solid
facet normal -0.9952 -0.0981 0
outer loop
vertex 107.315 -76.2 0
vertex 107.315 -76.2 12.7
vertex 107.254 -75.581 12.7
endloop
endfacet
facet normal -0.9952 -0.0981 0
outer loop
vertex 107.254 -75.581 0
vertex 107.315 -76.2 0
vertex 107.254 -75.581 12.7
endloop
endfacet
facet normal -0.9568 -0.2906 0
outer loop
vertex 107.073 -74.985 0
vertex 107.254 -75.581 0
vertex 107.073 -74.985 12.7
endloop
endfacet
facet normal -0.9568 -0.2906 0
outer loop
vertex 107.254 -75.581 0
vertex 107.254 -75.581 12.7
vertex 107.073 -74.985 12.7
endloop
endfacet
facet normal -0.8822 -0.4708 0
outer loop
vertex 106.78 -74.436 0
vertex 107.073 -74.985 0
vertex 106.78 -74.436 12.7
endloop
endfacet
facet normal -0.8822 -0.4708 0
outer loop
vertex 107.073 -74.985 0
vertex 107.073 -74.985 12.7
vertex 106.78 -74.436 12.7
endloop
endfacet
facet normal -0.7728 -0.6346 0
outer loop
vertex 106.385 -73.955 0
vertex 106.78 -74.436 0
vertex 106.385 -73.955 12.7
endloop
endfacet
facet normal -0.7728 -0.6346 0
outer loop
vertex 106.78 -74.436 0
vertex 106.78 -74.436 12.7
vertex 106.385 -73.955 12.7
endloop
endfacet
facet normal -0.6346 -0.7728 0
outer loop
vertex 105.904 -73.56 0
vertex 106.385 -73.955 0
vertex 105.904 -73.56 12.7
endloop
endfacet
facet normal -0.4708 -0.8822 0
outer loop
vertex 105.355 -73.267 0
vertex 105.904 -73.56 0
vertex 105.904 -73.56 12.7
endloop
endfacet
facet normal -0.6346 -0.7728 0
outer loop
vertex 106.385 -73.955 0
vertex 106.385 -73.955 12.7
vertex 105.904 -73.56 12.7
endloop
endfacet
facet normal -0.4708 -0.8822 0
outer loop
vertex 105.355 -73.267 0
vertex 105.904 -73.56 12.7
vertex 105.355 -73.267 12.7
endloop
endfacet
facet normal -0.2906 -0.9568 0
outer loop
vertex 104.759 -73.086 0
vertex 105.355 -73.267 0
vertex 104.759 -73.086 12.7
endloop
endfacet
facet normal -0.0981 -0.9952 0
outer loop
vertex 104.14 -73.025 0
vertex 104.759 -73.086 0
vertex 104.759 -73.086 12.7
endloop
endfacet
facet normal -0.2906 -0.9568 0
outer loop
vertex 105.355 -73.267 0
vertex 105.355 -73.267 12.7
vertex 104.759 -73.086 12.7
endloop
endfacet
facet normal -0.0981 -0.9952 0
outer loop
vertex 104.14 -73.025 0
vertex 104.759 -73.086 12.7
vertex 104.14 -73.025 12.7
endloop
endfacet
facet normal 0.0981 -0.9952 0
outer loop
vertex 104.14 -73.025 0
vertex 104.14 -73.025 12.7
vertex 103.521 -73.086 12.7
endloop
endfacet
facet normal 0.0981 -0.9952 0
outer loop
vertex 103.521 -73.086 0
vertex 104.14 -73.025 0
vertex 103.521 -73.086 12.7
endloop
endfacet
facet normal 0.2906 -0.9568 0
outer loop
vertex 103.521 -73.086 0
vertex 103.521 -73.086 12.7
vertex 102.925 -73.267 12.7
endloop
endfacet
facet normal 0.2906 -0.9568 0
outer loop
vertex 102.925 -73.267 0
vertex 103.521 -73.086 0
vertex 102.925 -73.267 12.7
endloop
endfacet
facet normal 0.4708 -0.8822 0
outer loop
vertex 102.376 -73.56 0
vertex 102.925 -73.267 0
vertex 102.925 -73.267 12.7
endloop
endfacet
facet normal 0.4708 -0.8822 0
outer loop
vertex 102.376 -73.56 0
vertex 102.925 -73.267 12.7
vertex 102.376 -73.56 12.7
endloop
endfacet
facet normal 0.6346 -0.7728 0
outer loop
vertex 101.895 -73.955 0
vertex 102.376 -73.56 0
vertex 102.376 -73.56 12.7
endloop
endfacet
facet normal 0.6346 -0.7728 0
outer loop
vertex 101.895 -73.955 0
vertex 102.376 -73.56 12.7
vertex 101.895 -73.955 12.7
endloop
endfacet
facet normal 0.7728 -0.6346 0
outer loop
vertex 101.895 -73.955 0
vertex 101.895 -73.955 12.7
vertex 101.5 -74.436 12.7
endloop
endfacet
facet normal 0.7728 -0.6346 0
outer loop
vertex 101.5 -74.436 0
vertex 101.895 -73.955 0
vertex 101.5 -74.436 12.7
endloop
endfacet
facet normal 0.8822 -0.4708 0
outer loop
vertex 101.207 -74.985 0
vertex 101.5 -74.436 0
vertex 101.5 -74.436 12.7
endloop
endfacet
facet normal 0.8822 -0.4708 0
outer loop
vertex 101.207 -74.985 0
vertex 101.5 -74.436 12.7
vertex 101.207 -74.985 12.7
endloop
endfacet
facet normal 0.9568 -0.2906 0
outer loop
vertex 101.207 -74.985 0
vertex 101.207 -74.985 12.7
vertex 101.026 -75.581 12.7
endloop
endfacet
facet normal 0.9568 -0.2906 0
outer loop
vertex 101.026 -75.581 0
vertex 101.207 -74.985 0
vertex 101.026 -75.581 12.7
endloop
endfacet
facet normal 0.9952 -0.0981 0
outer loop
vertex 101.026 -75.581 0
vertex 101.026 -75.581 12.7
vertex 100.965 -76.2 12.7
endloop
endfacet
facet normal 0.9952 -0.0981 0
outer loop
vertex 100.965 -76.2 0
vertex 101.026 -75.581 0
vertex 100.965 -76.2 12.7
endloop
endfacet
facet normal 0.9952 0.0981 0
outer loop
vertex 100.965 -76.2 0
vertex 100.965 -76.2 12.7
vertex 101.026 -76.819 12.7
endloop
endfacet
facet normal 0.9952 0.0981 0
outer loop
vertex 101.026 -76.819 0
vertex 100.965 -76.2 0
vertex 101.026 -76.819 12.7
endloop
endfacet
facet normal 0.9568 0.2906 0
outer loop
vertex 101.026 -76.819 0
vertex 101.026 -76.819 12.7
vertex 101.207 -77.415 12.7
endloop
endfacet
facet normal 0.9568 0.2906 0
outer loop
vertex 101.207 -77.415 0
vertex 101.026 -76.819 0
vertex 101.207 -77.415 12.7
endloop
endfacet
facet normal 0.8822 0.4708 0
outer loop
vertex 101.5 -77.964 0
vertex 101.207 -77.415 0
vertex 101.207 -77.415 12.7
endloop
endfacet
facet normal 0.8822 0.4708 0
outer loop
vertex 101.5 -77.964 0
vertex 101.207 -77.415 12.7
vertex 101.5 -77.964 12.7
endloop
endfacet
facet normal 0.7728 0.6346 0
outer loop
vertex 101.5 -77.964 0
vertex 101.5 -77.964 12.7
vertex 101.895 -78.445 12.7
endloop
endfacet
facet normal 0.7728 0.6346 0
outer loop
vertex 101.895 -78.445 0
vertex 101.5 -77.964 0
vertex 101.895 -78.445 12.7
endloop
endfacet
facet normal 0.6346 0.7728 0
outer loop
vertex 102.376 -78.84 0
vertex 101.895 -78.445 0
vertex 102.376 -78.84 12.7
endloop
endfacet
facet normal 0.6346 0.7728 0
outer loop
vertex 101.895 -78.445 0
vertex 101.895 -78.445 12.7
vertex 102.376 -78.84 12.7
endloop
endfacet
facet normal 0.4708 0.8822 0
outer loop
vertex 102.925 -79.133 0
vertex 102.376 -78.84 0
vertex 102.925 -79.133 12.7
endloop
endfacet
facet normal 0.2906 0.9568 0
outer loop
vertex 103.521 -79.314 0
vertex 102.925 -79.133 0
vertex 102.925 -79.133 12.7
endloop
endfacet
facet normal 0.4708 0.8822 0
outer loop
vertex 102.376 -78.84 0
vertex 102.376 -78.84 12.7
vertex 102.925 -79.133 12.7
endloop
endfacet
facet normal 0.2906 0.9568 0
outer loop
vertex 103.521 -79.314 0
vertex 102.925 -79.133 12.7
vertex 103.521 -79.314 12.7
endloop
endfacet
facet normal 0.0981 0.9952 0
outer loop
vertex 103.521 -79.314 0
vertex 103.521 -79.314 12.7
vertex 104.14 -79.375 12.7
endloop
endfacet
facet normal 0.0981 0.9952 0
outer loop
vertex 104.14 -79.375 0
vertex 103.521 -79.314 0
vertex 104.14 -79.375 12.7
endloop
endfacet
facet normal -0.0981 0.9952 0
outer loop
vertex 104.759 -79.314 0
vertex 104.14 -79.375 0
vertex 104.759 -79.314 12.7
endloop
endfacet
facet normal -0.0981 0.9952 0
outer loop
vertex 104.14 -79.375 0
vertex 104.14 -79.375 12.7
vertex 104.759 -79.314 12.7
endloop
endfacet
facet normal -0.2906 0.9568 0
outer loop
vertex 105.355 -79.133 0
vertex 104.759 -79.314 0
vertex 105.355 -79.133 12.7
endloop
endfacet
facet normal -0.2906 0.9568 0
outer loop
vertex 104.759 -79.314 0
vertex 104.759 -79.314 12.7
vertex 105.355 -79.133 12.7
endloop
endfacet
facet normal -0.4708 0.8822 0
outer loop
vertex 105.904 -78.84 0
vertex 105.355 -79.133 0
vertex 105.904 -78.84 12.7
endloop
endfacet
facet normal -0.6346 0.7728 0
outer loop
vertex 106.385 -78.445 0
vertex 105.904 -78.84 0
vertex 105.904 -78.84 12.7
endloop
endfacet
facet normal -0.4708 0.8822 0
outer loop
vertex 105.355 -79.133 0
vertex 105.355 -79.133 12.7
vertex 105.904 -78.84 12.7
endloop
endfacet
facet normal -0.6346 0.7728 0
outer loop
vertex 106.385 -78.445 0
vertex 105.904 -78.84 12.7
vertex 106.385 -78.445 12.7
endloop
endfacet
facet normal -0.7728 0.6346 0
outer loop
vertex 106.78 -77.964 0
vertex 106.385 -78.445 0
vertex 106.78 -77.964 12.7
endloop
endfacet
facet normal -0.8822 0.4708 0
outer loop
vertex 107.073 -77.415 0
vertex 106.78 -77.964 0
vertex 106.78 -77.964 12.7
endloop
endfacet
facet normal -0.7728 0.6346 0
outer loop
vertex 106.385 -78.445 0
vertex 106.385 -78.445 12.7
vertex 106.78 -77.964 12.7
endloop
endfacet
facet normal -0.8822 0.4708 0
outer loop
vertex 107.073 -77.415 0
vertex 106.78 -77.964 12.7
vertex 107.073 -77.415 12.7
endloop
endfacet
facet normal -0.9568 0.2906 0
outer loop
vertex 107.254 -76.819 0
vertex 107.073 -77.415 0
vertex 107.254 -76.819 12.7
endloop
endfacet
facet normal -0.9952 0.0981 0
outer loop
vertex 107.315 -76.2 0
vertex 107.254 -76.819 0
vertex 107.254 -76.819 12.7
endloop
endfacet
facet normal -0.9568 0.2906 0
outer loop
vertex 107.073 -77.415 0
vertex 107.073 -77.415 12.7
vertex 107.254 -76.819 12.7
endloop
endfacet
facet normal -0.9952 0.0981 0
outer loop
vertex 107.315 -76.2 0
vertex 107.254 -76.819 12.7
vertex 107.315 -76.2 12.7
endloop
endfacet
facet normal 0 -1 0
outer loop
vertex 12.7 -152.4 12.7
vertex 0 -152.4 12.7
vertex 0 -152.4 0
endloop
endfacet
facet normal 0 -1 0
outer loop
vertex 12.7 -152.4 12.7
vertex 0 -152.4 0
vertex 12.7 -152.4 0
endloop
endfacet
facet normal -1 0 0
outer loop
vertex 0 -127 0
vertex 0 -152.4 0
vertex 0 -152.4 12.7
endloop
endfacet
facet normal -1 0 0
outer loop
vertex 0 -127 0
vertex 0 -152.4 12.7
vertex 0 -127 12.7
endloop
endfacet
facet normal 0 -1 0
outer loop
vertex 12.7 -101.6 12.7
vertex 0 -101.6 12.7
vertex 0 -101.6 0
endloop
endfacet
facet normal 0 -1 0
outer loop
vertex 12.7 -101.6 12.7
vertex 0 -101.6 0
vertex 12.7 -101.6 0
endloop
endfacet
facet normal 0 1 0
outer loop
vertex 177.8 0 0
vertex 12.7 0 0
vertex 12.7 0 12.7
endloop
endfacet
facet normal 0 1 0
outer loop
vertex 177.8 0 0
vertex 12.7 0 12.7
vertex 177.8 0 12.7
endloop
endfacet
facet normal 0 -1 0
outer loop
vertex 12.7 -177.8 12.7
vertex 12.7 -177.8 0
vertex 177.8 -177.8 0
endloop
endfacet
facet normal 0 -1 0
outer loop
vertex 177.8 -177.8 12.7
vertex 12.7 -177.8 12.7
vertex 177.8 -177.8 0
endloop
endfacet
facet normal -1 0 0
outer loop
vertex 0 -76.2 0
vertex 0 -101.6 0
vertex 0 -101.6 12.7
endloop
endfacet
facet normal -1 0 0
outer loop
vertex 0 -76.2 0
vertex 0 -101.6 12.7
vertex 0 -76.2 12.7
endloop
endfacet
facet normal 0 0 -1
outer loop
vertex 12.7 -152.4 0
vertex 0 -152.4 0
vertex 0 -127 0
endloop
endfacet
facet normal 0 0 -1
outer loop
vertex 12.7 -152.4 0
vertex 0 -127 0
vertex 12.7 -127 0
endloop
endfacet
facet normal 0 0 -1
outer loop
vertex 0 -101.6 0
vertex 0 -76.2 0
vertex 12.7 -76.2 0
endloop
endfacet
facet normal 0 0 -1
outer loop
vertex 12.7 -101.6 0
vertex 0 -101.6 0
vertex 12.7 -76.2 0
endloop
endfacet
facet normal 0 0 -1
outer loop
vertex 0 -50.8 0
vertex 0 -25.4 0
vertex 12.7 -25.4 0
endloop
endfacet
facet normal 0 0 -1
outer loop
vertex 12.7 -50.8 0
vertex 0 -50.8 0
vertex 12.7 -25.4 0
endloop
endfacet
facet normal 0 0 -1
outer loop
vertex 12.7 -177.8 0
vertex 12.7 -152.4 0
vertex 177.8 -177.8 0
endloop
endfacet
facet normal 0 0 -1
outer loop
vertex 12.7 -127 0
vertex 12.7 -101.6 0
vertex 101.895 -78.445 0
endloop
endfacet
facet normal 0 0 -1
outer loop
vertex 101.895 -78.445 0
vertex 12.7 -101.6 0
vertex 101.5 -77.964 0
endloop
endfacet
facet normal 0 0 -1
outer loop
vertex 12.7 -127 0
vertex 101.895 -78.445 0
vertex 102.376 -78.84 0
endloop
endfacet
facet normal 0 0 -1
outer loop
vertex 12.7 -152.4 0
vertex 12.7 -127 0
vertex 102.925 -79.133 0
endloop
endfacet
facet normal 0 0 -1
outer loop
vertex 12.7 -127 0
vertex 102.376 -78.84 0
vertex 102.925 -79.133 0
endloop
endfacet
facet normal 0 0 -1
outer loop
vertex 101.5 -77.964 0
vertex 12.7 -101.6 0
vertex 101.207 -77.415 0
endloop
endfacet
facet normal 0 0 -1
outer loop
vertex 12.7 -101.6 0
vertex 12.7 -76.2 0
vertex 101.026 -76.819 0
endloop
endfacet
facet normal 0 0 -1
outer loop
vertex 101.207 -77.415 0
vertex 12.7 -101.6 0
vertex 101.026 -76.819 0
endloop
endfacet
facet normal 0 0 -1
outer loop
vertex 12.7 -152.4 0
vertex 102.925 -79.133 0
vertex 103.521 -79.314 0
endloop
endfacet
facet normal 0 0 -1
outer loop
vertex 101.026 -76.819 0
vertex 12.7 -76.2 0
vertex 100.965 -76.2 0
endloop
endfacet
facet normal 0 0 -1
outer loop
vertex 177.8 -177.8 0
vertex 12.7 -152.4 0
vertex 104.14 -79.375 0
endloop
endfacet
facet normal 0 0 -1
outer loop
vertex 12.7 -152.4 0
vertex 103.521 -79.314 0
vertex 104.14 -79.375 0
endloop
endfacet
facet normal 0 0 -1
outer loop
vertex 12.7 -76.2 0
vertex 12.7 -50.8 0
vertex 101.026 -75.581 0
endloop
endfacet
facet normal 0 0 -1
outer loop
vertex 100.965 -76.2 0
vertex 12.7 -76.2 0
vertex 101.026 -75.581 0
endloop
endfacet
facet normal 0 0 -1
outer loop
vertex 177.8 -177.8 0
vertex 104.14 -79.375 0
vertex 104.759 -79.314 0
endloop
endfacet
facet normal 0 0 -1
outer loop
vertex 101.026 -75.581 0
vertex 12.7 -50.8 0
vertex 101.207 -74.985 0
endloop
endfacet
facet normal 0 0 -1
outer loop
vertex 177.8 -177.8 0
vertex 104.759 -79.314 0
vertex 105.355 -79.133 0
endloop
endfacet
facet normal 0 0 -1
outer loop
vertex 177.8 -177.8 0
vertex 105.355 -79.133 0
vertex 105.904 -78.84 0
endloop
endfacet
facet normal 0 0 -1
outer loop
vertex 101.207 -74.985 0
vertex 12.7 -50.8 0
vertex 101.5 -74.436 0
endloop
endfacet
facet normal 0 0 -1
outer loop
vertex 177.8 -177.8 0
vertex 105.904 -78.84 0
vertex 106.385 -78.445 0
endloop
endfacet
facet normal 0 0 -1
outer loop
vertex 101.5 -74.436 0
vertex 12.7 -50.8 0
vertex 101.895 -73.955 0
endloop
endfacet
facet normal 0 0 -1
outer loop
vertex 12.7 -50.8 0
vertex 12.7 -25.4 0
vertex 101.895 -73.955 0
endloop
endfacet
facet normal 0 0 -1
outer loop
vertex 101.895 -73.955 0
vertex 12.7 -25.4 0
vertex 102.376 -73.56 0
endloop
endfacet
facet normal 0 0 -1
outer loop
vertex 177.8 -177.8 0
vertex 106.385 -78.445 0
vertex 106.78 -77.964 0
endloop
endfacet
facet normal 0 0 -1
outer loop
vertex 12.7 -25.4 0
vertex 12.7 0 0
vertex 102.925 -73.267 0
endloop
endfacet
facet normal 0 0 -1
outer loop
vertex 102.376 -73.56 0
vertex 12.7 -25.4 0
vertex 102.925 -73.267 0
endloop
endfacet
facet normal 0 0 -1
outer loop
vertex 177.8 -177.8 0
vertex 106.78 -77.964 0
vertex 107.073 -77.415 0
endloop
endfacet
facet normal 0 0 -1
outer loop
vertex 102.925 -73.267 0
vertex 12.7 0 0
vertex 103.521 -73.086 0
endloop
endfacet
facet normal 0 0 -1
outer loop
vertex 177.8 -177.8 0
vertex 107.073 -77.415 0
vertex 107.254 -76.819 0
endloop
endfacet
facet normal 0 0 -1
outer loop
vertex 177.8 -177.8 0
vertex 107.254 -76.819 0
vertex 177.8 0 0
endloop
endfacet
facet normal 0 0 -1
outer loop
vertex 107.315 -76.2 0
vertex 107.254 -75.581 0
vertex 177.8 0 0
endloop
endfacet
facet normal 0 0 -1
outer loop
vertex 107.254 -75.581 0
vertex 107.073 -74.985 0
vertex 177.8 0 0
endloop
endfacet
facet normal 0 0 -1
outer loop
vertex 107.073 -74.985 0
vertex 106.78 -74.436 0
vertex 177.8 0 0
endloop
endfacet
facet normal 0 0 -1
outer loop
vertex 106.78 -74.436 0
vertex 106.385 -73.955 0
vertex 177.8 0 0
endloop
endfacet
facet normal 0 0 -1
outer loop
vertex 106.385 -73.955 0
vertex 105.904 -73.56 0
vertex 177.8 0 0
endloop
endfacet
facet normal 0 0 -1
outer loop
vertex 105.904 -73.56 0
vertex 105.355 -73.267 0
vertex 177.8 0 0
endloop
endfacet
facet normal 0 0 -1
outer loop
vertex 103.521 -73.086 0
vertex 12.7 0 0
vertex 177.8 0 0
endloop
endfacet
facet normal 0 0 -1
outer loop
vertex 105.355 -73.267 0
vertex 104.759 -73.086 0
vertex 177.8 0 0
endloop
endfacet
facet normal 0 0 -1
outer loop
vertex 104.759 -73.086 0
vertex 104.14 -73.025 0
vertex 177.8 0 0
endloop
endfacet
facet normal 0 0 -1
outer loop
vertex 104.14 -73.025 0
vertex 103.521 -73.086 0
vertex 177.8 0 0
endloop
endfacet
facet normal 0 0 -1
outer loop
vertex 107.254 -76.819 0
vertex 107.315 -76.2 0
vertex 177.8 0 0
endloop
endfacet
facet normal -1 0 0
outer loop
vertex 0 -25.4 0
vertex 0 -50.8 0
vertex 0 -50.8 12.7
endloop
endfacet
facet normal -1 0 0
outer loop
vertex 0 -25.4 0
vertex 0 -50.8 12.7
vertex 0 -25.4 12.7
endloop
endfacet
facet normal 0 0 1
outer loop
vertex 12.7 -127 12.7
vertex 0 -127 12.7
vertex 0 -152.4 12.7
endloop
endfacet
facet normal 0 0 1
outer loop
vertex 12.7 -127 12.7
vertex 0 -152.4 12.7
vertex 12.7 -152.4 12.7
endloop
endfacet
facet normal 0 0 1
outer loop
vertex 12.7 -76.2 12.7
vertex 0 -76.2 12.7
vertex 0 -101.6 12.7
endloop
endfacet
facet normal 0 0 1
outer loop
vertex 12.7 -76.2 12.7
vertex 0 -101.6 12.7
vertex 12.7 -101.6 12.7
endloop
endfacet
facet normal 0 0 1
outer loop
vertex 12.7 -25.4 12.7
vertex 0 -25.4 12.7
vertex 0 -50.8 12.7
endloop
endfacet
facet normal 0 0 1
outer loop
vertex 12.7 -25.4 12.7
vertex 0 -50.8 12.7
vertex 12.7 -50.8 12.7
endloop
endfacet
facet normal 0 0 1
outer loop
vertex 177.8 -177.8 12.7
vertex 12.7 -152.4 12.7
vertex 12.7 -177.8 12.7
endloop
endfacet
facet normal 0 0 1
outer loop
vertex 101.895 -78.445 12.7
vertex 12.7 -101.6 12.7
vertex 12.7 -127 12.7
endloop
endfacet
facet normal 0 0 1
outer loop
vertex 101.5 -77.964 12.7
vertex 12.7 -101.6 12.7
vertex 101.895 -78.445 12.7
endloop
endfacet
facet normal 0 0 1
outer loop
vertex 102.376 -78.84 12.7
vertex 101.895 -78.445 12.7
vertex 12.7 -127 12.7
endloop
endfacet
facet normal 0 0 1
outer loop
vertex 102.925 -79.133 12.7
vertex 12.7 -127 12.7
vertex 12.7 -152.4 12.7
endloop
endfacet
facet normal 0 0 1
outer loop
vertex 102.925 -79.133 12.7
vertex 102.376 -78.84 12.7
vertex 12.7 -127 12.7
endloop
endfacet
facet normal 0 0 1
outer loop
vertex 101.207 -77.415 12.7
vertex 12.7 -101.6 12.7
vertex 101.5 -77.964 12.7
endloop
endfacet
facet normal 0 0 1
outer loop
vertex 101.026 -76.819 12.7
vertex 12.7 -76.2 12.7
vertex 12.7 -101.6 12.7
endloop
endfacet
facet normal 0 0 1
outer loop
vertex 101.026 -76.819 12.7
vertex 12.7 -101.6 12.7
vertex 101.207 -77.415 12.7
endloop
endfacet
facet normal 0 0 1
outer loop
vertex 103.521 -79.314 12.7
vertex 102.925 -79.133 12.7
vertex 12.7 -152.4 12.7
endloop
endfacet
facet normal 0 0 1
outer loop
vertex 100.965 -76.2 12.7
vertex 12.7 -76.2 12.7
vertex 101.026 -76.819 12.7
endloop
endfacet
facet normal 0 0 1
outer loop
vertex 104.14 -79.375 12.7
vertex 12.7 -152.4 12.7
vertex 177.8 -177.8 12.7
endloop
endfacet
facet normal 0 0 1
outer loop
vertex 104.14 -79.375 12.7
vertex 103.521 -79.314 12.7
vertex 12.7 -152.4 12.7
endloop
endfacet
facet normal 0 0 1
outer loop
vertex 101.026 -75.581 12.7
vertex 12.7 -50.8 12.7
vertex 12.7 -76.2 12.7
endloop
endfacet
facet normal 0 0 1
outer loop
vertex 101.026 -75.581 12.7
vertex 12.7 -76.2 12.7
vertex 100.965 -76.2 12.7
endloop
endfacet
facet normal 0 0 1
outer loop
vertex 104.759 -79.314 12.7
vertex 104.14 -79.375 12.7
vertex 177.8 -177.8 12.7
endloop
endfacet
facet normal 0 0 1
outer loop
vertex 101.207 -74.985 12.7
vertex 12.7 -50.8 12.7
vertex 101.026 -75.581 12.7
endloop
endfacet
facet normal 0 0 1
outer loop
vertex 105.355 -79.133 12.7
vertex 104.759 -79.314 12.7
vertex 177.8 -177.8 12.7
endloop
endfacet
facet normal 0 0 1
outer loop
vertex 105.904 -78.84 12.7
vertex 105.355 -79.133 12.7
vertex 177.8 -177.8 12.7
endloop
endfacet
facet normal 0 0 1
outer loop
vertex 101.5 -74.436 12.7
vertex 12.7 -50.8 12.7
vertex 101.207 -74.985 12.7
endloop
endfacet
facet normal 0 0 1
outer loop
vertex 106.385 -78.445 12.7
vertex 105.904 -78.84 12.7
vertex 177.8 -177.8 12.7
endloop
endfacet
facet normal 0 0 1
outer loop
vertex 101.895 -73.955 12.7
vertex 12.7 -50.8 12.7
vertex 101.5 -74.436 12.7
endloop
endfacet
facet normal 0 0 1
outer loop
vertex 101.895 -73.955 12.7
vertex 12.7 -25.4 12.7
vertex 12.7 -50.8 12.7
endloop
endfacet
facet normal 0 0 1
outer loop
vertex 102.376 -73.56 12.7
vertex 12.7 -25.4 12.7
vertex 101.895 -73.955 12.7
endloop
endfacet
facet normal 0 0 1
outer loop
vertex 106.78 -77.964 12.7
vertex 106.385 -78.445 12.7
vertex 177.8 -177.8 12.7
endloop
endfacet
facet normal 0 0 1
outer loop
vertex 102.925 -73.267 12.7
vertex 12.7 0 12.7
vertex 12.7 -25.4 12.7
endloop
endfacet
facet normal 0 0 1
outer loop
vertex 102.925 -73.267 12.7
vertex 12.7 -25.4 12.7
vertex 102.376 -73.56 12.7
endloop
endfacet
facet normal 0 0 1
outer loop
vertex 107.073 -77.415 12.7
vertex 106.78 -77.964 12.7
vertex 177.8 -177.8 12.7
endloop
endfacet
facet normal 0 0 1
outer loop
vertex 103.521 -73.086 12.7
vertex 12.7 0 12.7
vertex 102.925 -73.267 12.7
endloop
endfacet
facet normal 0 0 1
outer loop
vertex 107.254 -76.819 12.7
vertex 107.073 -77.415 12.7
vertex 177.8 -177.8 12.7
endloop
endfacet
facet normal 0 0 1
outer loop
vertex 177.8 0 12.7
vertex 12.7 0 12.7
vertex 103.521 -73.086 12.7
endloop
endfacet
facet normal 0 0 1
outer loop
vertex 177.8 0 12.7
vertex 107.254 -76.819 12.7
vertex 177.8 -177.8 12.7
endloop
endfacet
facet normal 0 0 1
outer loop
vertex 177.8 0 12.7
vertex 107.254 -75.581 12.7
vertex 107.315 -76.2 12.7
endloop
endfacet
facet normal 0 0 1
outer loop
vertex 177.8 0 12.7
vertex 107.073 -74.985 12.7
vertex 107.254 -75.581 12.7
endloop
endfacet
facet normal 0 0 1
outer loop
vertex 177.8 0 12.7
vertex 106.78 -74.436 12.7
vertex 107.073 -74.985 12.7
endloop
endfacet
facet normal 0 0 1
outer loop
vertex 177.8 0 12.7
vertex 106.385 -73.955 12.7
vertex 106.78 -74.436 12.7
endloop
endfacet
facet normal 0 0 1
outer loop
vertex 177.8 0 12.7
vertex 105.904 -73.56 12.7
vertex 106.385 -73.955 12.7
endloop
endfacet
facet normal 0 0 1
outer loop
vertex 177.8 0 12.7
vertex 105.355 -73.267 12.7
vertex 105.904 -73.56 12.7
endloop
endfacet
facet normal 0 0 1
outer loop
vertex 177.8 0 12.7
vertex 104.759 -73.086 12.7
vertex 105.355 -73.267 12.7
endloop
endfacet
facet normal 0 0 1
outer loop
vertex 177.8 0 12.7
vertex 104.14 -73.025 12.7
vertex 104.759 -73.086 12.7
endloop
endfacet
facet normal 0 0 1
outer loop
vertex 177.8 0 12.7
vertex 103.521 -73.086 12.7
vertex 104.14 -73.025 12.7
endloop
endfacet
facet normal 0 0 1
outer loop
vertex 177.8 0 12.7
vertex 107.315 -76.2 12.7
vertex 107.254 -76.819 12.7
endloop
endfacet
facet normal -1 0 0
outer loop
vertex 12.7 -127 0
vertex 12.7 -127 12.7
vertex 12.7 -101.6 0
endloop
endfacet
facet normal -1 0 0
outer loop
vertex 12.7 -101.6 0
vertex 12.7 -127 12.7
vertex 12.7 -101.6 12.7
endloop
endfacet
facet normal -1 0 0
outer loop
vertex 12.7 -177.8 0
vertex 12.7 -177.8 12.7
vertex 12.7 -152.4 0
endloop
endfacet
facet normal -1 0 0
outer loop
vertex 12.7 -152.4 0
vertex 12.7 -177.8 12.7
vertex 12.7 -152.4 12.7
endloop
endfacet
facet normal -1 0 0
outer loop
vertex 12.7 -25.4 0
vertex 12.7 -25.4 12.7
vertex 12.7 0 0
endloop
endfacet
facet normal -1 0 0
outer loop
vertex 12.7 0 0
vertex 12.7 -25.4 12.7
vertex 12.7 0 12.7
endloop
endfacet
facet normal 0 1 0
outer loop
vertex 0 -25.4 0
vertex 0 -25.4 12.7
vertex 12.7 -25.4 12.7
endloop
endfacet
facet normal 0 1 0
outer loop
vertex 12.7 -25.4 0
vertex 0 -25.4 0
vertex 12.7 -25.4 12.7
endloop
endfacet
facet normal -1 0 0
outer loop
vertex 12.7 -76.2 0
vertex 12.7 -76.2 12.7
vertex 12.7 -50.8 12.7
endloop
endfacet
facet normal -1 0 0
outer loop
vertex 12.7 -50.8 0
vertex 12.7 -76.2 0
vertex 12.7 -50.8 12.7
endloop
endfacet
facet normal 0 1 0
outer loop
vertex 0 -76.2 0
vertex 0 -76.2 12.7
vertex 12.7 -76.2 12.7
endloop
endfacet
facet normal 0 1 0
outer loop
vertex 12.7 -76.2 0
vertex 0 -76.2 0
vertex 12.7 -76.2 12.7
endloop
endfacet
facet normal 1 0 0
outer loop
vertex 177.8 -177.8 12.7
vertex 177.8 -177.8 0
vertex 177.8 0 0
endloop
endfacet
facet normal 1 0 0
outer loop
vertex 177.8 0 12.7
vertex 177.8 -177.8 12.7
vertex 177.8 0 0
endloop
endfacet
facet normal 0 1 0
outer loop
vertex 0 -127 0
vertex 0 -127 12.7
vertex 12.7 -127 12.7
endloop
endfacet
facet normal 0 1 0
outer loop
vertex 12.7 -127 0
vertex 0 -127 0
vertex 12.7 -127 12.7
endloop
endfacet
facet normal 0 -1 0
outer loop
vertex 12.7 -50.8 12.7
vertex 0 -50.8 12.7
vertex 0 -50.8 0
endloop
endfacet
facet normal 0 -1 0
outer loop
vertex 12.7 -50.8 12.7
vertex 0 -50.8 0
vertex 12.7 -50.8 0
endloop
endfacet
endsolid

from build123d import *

# Parameters (mm, degrees)
SKETCH1_W           = 177.8
SKETCH1_H           = 177.8
BOSS_EXTRUDE1_DEPTH = 12.7
SKETCH2_R           = 3.175
CUT_EXTRUDE3_DEPTH  = 13.7
SKETCH4_W           = 12.7
SKETCH4_H           = 25.4
CUT_EXTRUDE4_DEPTH  = 13.7


with BuildPart() as part:
    # Sketch1 → Boss-Extrude1 (new body)
    with BuildSketch(Plane.XY):
        with Locations((88.9, -88.9)):
            Rectangle(SKETCH1_W, SKETCH1_H)
    extrude(amount=BOSS_EXTRUDE1_DEPTH)

    # Sketch2 → Cut-Extrude3 (cut, through all)
    with BuildSketch(Plane.XY.offset(12.7)):
        with Locations((104.14, -76.2)):
            Circle(SKETCH2_R)
    extrude(amount=-CUT_EXTRUDE3_DEPTH, mode=Mode.SUBTRACT)

    # Sketch4 → Cut-Extrude4 (cut, through all)
    with BuildSketch(Plane.XY.offset(12.7)):
        with Locations((6.35, -12.7)):
            Rectangle(SKETCH4_W, SKETCH4_H)
        with Locations((6.35, -63.5)):
            Rectangle(SKETCH4_W, SKETCH4_H)
        with Locations((6.35, -114.3)):
            Rectangle(SKETCH4_W, SKETCH4_H)
        with Locations((6.35, -165.1)):
            Rectangle(SKETCH4_W, SKETCH4_H)
    extrude(amount=-CUT_EXTRUDE4_DEPTH, mode=Mode.SUBTRACT)


solid = part.part
